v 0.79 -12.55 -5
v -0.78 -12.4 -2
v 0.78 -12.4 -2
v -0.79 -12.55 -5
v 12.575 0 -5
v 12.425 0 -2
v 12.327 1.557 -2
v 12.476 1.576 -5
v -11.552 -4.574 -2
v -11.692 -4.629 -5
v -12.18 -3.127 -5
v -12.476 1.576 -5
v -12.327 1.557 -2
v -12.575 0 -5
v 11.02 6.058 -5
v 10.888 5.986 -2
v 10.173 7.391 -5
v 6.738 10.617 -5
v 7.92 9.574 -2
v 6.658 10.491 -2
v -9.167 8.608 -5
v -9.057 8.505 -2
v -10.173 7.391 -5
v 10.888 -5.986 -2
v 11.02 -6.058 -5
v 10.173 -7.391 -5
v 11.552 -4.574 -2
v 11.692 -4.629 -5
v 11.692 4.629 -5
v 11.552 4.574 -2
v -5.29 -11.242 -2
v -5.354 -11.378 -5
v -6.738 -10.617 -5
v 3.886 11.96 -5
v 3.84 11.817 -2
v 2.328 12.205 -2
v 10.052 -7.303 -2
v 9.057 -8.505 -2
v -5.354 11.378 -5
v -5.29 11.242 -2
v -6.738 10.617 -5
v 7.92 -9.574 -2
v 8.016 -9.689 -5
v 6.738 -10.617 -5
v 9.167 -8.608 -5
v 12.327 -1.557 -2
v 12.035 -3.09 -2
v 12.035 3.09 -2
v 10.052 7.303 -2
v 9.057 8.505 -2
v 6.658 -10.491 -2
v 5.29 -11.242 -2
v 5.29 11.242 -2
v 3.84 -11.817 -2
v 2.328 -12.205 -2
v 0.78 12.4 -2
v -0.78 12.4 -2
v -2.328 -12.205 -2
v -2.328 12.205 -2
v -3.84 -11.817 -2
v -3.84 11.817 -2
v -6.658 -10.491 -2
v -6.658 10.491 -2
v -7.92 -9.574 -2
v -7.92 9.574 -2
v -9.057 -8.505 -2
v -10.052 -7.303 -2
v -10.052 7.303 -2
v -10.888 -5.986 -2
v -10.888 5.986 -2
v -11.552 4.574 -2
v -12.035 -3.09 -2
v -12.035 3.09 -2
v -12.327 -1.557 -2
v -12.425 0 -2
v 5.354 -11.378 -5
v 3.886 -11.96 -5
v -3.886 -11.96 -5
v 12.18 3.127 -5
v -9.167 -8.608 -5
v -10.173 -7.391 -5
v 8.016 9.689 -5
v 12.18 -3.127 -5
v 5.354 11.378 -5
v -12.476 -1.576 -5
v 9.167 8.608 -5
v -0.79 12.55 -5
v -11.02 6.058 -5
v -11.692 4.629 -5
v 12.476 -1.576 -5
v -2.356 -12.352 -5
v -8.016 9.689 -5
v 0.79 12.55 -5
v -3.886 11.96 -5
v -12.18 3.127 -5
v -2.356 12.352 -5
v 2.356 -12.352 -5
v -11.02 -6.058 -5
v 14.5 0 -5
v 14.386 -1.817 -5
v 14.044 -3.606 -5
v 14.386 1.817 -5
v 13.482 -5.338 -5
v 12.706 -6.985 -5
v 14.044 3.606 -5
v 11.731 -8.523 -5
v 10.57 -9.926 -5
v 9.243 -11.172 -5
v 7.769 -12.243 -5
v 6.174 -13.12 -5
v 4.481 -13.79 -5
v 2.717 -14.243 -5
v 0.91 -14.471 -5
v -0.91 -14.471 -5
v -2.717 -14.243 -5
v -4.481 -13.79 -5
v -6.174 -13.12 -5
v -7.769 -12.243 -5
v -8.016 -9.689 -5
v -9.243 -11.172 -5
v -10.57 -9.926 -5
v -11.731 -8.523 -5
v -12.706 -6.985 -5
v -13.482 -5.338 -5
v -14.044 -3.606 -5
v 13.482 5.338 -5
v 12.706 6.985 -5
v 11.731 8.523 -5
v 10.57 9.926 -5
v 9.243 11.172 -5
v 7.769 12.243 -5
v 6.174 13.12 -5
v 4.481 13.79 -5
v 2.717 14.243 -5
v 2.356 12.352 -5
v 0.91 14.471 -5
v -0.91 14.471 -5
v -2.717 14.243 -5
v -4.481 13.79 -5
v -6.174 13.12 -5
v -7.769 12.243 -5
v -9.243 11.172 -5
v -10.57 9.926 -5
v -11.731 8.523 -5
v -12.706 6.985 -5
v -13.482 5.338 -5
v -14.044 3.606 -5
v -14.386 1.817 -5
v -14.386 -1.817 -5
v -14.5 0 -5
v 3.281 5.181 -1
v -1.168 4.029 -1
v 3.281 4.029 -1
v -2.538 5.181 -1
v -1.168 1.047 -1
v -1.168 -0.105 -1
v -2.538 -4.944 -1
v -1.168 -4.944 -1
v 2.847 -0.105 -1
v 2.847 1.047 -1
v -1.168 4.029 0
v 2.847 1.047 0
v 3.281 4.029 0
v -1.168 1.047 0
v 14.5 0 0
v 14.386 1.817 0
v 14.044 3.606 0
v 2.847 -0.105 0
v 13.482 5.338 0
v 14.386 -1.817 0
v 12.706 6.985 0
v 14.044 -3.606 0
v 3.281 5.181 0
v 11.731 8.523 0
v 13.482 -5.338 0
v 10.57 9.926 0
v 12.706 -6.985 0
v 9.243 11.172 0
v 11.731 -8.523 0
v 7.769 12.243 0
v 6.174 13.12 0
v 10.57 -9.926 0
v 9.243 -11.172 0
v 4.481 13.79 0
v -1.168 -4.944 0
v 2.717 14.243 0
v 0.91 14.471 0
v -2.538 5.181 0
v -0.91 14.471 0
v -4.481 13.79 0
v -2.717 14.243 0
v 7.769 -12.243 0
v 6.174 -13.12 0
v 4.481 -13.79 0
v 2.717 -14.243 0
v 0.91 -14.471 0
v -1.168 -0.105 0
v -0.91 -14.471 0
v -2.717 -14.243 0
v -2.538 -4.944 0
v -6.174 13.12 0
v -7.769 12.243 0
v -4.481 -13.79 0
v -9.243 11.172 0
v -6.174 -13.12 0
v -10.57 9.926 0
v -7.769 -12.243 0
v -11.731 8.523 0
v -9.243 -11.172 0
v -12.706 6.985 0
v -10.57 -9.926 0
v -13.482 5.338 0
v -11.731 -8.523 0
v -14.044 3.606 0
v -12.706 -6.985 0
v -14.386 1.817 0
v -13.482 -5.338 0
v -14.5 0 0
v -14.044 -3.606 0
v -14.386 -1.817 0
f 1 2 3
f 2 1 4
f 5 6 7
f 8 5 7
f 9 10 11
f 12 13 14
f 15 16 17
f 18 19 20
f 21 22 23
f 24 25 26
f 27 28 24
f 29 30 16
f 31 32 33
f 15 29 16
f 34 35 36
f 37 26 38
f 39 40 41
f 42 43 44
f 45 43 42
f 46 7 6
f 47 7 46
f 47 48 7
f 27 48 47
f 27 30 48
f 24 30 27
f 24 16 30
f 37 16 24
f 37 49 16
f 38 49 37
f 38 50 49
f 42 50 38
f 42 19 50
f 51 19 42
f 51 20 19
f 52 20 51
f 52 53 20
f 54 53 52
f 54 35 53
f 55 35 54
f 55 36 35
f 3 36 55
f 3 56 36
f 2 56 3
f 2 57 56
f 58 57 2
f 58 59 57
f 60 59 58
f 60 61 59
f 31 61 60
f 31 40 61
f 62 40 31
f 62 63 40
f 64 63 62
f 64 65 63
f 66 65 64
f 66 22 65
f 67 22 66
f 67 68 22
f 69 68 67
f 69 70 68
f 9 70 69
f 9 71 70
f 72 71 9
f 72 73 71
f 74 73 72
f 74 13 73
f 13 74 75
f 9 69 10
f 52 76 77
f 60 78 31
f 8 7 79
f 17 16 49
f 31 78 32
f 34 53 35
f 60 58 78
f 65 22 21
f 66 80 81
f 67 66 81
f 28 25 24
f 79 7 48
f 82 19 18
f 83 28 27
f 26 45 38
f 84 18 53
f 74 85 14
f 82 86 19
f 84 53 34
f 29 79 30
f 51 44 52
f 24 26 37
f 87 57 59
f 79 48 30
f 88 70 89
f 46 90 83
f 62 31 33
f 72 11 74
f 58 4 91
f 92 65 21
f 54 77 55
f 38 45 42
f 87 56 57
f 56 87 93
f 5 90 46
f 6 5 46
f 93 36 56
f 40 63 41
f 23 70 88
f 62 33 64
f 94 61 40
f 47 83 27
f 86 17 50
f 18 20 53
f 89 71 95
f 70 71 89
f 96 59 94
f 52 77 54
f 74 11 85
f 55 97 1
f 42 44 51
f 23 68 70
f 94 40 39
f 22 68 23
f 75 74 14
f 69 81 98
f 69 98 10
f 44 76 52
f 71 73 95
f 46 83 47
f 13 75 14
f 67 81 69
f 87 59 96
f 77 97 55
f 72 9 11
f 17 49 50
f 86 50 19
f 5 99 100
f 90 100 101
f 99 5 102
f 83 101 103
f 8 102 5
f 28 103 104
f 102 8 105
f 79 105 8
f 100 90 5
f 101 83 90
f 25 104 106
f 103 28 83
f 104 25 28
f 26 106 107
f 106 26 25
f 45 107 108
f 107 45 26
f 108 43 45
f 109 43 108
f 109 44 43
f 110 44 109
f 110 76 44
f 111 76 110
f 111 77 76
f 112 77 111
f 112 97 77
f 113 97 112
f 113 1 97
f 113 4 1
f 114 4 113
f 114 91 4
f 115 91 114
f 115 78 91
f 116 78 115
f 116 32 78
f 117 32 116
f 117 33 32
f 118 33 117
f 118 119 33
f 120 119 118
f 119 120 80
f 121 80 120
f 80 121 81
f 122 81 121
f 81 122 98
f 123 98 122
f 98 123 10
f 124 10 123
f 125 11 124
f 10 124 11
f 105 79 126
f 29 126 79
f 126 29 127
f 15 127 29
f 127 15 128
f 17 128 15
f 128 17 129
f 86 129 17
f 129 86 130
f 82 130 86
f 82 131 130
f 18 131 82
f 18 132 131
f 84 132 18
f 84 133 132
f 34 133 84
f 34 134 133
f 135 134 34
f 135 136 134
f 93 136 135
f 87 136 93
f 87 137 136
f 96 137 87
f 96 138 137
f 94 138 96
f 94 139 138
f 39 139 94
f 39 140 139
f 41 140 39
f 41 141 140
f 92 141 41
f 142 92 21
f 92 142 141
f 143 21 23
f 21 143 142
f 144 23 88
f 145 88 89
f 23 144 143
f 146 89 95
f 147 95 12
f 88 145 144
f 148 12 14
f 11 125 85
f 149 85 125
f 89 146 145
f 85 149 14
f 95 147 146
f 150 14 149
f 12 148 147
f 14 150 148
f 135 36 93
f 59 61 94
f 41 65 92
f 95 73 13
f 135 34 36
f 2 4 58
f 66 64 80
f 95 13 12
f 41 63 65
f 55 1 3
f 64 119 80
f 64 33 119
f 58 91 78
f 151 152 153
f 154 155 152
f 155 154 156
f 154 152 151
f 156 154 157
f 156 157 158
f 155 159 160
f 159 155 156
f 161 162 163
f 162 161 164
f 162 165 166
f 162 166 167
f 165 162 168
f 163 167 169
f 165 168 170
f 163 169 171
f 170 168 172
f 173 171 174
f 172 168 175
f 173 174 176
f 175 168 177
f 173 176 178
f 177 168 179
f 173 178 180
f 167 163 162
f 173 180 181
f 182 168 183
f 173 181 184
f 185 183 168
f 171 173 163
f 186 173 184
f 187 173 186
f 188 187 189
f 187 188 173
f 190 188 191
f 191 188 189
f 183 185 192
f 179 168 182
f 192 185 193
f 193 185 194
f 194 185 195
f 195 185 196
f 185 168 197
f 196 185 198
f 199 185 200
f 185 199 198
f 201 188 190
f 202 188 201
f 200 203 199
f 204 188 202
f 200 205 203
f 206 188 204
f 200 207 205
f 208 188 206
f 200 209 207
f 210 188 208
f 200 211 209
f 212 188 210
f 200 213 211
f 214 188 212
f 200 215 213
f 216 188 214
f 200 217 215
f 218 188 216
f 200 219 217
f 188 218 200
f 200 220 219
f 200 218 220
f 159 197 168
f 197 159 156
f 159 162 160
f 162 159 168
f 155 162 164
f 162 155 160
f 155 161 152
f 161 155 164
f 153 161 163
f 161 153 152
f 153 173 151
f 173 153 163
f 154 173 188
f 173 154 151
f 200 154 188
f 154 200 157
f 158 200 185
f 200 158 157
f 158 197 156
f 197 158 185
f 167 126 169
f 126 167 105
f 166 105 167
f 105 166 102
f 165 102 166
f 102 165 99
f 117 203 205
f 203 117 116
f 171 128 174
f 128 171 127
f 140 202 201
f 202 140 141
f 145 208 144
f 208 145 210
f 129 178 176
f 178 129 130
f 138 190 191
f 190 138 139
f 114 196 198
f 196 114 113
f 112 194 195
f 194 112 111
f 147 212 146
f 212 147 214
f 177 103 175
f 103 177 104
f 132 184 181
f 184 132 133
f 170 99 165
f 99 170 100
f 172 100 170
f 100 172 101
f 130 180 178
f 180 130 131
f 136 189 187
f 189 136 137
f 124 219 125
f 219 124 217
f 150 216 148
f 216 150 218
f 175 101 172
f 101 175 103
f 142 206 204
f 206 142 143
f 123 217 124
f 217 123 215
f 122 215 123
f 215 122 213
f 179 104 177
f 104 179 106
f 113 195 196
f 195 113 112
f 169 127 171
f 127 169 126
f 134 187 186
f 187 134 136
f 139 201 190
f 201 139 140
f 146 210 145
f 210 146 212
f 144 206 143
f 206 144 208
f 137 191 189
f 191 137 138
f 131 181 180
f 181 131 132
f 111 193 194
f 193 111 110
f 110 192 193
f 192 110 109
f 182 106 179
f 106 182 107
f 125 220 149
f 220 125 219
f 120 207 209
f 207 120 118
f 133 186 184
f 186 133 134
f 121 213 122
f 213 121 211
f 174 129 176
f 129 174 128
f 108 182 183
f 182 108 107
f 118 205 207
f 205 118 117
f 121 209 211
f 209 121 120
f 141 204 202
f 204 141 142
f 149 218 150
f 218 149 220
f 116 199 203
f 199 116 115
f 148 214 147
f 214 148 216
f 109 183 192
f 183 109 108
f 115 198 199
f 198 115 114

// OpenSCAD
$fn = 50;


difference() {
	union() {
		translate(v = [0, 0, -5.0000000000]) {
			cylinder(h = 5, r = 14.5000000000);
		}
	}
	union() {
		#translate(v = [0, 0, -5.0000000000]) {
			cylinder(h = 3, r1 = 12.5750000000, r2 = 12.4250000000);
		}
		translate(v = [0, 0, -1]) {
			linear_extrude(height = 1) {
				text(font = "Impact", halign = "center", size = 10, text = "F", valign = "center");
			}
		}
	}
}
